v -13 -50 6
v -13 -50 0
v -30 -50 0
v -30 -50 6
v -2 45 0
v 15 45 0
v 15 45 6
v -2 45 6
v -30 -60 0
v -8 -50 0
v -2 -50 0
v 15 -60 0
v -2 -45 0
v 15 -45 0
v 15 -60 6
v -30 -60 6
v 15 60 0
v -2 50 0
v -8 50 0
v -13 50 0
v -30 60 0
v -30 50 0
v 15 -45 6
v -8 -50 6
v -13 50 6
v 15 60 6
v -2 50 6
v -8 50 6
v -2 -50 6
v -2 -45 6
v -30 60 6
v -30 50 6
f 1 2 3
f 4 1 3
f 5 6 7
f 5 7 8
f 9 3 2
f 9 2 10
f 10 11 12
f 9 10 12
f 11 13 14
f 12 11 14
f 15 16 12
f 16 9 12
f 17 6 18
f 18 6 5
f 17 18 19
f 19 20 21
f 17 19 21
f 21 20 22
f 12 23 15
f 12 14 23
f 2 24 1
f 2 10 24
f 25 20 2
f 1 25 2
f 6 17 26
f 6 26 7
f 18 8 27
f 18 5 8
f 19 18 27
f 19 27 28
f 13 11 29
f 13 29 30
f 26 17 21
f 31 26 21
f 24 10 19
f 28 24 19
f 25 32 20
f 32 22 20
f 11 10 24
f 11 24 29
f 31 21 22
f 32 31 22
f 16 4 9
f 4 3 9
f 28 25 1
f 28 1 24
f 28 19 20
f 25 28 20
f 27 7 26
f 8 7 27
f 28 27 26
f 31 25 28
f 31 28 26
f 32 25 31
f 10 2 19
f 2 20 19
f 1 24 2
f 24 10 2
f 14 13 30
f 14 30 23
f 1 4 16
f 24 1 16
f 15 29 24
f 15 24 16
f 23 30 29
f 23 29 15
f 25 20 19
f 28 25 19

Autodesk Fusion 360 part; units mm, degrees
sketch "Sketch1" plane through (0, 0, 0) normal (0, 0, 1) x (1, 0, 0)
  line L0 (-30, 50) -> (-8, 50) construction
  line L1 (-8, 50) -> (-8, 60) construction
  line L2 (-8, 50) -> (-8, -60) construction
  line L3 (-8, -60) -> (-8, -50) construction
  line L4 (-8, -50) -> (-2, -50)
  line L5 (-2, -50) -> (-2, -45)
  line L6 (-2, -45) -> (15, -45)
  line L7 (15, -45) -> (15, -60)
  line L8 (-8, -50) -> (-30, -50)
  line L9 (-30, -50) -> (-30, -60)
  line L10 (-30, -60) -> (15, -60)
  line L11 (-8, 50) -> (-13, 50)
  line L12 (-13, 50) -> (-13, -50)
  line L13 (-13, -50) -> (-8, -50)
  line L14 (-8, -50) -> (-8, 50)
  dimension "d3" = 22
  dimension "d4" = 17
  dimension "d10" = 5
extrude "Extrude1" add sketch "Sketch1" along normal blind 6 contours L4 L5 L6 L7 L8 L9 L10 L13 makes body 1
ref_plane "WorkPlane1" through (0, 0, 0) normal (0, 1, 0) x (0, 0, 1)
mirror "Mirror1" about plane through (0, 0, 0) normal (0, 1, 0) of bodies 1 makes body 2
extrude "Extrude2" add sketch "Sketch1" along normal blind 6 separate body contours L8 L11 L12 L13 L14 makes body 3
